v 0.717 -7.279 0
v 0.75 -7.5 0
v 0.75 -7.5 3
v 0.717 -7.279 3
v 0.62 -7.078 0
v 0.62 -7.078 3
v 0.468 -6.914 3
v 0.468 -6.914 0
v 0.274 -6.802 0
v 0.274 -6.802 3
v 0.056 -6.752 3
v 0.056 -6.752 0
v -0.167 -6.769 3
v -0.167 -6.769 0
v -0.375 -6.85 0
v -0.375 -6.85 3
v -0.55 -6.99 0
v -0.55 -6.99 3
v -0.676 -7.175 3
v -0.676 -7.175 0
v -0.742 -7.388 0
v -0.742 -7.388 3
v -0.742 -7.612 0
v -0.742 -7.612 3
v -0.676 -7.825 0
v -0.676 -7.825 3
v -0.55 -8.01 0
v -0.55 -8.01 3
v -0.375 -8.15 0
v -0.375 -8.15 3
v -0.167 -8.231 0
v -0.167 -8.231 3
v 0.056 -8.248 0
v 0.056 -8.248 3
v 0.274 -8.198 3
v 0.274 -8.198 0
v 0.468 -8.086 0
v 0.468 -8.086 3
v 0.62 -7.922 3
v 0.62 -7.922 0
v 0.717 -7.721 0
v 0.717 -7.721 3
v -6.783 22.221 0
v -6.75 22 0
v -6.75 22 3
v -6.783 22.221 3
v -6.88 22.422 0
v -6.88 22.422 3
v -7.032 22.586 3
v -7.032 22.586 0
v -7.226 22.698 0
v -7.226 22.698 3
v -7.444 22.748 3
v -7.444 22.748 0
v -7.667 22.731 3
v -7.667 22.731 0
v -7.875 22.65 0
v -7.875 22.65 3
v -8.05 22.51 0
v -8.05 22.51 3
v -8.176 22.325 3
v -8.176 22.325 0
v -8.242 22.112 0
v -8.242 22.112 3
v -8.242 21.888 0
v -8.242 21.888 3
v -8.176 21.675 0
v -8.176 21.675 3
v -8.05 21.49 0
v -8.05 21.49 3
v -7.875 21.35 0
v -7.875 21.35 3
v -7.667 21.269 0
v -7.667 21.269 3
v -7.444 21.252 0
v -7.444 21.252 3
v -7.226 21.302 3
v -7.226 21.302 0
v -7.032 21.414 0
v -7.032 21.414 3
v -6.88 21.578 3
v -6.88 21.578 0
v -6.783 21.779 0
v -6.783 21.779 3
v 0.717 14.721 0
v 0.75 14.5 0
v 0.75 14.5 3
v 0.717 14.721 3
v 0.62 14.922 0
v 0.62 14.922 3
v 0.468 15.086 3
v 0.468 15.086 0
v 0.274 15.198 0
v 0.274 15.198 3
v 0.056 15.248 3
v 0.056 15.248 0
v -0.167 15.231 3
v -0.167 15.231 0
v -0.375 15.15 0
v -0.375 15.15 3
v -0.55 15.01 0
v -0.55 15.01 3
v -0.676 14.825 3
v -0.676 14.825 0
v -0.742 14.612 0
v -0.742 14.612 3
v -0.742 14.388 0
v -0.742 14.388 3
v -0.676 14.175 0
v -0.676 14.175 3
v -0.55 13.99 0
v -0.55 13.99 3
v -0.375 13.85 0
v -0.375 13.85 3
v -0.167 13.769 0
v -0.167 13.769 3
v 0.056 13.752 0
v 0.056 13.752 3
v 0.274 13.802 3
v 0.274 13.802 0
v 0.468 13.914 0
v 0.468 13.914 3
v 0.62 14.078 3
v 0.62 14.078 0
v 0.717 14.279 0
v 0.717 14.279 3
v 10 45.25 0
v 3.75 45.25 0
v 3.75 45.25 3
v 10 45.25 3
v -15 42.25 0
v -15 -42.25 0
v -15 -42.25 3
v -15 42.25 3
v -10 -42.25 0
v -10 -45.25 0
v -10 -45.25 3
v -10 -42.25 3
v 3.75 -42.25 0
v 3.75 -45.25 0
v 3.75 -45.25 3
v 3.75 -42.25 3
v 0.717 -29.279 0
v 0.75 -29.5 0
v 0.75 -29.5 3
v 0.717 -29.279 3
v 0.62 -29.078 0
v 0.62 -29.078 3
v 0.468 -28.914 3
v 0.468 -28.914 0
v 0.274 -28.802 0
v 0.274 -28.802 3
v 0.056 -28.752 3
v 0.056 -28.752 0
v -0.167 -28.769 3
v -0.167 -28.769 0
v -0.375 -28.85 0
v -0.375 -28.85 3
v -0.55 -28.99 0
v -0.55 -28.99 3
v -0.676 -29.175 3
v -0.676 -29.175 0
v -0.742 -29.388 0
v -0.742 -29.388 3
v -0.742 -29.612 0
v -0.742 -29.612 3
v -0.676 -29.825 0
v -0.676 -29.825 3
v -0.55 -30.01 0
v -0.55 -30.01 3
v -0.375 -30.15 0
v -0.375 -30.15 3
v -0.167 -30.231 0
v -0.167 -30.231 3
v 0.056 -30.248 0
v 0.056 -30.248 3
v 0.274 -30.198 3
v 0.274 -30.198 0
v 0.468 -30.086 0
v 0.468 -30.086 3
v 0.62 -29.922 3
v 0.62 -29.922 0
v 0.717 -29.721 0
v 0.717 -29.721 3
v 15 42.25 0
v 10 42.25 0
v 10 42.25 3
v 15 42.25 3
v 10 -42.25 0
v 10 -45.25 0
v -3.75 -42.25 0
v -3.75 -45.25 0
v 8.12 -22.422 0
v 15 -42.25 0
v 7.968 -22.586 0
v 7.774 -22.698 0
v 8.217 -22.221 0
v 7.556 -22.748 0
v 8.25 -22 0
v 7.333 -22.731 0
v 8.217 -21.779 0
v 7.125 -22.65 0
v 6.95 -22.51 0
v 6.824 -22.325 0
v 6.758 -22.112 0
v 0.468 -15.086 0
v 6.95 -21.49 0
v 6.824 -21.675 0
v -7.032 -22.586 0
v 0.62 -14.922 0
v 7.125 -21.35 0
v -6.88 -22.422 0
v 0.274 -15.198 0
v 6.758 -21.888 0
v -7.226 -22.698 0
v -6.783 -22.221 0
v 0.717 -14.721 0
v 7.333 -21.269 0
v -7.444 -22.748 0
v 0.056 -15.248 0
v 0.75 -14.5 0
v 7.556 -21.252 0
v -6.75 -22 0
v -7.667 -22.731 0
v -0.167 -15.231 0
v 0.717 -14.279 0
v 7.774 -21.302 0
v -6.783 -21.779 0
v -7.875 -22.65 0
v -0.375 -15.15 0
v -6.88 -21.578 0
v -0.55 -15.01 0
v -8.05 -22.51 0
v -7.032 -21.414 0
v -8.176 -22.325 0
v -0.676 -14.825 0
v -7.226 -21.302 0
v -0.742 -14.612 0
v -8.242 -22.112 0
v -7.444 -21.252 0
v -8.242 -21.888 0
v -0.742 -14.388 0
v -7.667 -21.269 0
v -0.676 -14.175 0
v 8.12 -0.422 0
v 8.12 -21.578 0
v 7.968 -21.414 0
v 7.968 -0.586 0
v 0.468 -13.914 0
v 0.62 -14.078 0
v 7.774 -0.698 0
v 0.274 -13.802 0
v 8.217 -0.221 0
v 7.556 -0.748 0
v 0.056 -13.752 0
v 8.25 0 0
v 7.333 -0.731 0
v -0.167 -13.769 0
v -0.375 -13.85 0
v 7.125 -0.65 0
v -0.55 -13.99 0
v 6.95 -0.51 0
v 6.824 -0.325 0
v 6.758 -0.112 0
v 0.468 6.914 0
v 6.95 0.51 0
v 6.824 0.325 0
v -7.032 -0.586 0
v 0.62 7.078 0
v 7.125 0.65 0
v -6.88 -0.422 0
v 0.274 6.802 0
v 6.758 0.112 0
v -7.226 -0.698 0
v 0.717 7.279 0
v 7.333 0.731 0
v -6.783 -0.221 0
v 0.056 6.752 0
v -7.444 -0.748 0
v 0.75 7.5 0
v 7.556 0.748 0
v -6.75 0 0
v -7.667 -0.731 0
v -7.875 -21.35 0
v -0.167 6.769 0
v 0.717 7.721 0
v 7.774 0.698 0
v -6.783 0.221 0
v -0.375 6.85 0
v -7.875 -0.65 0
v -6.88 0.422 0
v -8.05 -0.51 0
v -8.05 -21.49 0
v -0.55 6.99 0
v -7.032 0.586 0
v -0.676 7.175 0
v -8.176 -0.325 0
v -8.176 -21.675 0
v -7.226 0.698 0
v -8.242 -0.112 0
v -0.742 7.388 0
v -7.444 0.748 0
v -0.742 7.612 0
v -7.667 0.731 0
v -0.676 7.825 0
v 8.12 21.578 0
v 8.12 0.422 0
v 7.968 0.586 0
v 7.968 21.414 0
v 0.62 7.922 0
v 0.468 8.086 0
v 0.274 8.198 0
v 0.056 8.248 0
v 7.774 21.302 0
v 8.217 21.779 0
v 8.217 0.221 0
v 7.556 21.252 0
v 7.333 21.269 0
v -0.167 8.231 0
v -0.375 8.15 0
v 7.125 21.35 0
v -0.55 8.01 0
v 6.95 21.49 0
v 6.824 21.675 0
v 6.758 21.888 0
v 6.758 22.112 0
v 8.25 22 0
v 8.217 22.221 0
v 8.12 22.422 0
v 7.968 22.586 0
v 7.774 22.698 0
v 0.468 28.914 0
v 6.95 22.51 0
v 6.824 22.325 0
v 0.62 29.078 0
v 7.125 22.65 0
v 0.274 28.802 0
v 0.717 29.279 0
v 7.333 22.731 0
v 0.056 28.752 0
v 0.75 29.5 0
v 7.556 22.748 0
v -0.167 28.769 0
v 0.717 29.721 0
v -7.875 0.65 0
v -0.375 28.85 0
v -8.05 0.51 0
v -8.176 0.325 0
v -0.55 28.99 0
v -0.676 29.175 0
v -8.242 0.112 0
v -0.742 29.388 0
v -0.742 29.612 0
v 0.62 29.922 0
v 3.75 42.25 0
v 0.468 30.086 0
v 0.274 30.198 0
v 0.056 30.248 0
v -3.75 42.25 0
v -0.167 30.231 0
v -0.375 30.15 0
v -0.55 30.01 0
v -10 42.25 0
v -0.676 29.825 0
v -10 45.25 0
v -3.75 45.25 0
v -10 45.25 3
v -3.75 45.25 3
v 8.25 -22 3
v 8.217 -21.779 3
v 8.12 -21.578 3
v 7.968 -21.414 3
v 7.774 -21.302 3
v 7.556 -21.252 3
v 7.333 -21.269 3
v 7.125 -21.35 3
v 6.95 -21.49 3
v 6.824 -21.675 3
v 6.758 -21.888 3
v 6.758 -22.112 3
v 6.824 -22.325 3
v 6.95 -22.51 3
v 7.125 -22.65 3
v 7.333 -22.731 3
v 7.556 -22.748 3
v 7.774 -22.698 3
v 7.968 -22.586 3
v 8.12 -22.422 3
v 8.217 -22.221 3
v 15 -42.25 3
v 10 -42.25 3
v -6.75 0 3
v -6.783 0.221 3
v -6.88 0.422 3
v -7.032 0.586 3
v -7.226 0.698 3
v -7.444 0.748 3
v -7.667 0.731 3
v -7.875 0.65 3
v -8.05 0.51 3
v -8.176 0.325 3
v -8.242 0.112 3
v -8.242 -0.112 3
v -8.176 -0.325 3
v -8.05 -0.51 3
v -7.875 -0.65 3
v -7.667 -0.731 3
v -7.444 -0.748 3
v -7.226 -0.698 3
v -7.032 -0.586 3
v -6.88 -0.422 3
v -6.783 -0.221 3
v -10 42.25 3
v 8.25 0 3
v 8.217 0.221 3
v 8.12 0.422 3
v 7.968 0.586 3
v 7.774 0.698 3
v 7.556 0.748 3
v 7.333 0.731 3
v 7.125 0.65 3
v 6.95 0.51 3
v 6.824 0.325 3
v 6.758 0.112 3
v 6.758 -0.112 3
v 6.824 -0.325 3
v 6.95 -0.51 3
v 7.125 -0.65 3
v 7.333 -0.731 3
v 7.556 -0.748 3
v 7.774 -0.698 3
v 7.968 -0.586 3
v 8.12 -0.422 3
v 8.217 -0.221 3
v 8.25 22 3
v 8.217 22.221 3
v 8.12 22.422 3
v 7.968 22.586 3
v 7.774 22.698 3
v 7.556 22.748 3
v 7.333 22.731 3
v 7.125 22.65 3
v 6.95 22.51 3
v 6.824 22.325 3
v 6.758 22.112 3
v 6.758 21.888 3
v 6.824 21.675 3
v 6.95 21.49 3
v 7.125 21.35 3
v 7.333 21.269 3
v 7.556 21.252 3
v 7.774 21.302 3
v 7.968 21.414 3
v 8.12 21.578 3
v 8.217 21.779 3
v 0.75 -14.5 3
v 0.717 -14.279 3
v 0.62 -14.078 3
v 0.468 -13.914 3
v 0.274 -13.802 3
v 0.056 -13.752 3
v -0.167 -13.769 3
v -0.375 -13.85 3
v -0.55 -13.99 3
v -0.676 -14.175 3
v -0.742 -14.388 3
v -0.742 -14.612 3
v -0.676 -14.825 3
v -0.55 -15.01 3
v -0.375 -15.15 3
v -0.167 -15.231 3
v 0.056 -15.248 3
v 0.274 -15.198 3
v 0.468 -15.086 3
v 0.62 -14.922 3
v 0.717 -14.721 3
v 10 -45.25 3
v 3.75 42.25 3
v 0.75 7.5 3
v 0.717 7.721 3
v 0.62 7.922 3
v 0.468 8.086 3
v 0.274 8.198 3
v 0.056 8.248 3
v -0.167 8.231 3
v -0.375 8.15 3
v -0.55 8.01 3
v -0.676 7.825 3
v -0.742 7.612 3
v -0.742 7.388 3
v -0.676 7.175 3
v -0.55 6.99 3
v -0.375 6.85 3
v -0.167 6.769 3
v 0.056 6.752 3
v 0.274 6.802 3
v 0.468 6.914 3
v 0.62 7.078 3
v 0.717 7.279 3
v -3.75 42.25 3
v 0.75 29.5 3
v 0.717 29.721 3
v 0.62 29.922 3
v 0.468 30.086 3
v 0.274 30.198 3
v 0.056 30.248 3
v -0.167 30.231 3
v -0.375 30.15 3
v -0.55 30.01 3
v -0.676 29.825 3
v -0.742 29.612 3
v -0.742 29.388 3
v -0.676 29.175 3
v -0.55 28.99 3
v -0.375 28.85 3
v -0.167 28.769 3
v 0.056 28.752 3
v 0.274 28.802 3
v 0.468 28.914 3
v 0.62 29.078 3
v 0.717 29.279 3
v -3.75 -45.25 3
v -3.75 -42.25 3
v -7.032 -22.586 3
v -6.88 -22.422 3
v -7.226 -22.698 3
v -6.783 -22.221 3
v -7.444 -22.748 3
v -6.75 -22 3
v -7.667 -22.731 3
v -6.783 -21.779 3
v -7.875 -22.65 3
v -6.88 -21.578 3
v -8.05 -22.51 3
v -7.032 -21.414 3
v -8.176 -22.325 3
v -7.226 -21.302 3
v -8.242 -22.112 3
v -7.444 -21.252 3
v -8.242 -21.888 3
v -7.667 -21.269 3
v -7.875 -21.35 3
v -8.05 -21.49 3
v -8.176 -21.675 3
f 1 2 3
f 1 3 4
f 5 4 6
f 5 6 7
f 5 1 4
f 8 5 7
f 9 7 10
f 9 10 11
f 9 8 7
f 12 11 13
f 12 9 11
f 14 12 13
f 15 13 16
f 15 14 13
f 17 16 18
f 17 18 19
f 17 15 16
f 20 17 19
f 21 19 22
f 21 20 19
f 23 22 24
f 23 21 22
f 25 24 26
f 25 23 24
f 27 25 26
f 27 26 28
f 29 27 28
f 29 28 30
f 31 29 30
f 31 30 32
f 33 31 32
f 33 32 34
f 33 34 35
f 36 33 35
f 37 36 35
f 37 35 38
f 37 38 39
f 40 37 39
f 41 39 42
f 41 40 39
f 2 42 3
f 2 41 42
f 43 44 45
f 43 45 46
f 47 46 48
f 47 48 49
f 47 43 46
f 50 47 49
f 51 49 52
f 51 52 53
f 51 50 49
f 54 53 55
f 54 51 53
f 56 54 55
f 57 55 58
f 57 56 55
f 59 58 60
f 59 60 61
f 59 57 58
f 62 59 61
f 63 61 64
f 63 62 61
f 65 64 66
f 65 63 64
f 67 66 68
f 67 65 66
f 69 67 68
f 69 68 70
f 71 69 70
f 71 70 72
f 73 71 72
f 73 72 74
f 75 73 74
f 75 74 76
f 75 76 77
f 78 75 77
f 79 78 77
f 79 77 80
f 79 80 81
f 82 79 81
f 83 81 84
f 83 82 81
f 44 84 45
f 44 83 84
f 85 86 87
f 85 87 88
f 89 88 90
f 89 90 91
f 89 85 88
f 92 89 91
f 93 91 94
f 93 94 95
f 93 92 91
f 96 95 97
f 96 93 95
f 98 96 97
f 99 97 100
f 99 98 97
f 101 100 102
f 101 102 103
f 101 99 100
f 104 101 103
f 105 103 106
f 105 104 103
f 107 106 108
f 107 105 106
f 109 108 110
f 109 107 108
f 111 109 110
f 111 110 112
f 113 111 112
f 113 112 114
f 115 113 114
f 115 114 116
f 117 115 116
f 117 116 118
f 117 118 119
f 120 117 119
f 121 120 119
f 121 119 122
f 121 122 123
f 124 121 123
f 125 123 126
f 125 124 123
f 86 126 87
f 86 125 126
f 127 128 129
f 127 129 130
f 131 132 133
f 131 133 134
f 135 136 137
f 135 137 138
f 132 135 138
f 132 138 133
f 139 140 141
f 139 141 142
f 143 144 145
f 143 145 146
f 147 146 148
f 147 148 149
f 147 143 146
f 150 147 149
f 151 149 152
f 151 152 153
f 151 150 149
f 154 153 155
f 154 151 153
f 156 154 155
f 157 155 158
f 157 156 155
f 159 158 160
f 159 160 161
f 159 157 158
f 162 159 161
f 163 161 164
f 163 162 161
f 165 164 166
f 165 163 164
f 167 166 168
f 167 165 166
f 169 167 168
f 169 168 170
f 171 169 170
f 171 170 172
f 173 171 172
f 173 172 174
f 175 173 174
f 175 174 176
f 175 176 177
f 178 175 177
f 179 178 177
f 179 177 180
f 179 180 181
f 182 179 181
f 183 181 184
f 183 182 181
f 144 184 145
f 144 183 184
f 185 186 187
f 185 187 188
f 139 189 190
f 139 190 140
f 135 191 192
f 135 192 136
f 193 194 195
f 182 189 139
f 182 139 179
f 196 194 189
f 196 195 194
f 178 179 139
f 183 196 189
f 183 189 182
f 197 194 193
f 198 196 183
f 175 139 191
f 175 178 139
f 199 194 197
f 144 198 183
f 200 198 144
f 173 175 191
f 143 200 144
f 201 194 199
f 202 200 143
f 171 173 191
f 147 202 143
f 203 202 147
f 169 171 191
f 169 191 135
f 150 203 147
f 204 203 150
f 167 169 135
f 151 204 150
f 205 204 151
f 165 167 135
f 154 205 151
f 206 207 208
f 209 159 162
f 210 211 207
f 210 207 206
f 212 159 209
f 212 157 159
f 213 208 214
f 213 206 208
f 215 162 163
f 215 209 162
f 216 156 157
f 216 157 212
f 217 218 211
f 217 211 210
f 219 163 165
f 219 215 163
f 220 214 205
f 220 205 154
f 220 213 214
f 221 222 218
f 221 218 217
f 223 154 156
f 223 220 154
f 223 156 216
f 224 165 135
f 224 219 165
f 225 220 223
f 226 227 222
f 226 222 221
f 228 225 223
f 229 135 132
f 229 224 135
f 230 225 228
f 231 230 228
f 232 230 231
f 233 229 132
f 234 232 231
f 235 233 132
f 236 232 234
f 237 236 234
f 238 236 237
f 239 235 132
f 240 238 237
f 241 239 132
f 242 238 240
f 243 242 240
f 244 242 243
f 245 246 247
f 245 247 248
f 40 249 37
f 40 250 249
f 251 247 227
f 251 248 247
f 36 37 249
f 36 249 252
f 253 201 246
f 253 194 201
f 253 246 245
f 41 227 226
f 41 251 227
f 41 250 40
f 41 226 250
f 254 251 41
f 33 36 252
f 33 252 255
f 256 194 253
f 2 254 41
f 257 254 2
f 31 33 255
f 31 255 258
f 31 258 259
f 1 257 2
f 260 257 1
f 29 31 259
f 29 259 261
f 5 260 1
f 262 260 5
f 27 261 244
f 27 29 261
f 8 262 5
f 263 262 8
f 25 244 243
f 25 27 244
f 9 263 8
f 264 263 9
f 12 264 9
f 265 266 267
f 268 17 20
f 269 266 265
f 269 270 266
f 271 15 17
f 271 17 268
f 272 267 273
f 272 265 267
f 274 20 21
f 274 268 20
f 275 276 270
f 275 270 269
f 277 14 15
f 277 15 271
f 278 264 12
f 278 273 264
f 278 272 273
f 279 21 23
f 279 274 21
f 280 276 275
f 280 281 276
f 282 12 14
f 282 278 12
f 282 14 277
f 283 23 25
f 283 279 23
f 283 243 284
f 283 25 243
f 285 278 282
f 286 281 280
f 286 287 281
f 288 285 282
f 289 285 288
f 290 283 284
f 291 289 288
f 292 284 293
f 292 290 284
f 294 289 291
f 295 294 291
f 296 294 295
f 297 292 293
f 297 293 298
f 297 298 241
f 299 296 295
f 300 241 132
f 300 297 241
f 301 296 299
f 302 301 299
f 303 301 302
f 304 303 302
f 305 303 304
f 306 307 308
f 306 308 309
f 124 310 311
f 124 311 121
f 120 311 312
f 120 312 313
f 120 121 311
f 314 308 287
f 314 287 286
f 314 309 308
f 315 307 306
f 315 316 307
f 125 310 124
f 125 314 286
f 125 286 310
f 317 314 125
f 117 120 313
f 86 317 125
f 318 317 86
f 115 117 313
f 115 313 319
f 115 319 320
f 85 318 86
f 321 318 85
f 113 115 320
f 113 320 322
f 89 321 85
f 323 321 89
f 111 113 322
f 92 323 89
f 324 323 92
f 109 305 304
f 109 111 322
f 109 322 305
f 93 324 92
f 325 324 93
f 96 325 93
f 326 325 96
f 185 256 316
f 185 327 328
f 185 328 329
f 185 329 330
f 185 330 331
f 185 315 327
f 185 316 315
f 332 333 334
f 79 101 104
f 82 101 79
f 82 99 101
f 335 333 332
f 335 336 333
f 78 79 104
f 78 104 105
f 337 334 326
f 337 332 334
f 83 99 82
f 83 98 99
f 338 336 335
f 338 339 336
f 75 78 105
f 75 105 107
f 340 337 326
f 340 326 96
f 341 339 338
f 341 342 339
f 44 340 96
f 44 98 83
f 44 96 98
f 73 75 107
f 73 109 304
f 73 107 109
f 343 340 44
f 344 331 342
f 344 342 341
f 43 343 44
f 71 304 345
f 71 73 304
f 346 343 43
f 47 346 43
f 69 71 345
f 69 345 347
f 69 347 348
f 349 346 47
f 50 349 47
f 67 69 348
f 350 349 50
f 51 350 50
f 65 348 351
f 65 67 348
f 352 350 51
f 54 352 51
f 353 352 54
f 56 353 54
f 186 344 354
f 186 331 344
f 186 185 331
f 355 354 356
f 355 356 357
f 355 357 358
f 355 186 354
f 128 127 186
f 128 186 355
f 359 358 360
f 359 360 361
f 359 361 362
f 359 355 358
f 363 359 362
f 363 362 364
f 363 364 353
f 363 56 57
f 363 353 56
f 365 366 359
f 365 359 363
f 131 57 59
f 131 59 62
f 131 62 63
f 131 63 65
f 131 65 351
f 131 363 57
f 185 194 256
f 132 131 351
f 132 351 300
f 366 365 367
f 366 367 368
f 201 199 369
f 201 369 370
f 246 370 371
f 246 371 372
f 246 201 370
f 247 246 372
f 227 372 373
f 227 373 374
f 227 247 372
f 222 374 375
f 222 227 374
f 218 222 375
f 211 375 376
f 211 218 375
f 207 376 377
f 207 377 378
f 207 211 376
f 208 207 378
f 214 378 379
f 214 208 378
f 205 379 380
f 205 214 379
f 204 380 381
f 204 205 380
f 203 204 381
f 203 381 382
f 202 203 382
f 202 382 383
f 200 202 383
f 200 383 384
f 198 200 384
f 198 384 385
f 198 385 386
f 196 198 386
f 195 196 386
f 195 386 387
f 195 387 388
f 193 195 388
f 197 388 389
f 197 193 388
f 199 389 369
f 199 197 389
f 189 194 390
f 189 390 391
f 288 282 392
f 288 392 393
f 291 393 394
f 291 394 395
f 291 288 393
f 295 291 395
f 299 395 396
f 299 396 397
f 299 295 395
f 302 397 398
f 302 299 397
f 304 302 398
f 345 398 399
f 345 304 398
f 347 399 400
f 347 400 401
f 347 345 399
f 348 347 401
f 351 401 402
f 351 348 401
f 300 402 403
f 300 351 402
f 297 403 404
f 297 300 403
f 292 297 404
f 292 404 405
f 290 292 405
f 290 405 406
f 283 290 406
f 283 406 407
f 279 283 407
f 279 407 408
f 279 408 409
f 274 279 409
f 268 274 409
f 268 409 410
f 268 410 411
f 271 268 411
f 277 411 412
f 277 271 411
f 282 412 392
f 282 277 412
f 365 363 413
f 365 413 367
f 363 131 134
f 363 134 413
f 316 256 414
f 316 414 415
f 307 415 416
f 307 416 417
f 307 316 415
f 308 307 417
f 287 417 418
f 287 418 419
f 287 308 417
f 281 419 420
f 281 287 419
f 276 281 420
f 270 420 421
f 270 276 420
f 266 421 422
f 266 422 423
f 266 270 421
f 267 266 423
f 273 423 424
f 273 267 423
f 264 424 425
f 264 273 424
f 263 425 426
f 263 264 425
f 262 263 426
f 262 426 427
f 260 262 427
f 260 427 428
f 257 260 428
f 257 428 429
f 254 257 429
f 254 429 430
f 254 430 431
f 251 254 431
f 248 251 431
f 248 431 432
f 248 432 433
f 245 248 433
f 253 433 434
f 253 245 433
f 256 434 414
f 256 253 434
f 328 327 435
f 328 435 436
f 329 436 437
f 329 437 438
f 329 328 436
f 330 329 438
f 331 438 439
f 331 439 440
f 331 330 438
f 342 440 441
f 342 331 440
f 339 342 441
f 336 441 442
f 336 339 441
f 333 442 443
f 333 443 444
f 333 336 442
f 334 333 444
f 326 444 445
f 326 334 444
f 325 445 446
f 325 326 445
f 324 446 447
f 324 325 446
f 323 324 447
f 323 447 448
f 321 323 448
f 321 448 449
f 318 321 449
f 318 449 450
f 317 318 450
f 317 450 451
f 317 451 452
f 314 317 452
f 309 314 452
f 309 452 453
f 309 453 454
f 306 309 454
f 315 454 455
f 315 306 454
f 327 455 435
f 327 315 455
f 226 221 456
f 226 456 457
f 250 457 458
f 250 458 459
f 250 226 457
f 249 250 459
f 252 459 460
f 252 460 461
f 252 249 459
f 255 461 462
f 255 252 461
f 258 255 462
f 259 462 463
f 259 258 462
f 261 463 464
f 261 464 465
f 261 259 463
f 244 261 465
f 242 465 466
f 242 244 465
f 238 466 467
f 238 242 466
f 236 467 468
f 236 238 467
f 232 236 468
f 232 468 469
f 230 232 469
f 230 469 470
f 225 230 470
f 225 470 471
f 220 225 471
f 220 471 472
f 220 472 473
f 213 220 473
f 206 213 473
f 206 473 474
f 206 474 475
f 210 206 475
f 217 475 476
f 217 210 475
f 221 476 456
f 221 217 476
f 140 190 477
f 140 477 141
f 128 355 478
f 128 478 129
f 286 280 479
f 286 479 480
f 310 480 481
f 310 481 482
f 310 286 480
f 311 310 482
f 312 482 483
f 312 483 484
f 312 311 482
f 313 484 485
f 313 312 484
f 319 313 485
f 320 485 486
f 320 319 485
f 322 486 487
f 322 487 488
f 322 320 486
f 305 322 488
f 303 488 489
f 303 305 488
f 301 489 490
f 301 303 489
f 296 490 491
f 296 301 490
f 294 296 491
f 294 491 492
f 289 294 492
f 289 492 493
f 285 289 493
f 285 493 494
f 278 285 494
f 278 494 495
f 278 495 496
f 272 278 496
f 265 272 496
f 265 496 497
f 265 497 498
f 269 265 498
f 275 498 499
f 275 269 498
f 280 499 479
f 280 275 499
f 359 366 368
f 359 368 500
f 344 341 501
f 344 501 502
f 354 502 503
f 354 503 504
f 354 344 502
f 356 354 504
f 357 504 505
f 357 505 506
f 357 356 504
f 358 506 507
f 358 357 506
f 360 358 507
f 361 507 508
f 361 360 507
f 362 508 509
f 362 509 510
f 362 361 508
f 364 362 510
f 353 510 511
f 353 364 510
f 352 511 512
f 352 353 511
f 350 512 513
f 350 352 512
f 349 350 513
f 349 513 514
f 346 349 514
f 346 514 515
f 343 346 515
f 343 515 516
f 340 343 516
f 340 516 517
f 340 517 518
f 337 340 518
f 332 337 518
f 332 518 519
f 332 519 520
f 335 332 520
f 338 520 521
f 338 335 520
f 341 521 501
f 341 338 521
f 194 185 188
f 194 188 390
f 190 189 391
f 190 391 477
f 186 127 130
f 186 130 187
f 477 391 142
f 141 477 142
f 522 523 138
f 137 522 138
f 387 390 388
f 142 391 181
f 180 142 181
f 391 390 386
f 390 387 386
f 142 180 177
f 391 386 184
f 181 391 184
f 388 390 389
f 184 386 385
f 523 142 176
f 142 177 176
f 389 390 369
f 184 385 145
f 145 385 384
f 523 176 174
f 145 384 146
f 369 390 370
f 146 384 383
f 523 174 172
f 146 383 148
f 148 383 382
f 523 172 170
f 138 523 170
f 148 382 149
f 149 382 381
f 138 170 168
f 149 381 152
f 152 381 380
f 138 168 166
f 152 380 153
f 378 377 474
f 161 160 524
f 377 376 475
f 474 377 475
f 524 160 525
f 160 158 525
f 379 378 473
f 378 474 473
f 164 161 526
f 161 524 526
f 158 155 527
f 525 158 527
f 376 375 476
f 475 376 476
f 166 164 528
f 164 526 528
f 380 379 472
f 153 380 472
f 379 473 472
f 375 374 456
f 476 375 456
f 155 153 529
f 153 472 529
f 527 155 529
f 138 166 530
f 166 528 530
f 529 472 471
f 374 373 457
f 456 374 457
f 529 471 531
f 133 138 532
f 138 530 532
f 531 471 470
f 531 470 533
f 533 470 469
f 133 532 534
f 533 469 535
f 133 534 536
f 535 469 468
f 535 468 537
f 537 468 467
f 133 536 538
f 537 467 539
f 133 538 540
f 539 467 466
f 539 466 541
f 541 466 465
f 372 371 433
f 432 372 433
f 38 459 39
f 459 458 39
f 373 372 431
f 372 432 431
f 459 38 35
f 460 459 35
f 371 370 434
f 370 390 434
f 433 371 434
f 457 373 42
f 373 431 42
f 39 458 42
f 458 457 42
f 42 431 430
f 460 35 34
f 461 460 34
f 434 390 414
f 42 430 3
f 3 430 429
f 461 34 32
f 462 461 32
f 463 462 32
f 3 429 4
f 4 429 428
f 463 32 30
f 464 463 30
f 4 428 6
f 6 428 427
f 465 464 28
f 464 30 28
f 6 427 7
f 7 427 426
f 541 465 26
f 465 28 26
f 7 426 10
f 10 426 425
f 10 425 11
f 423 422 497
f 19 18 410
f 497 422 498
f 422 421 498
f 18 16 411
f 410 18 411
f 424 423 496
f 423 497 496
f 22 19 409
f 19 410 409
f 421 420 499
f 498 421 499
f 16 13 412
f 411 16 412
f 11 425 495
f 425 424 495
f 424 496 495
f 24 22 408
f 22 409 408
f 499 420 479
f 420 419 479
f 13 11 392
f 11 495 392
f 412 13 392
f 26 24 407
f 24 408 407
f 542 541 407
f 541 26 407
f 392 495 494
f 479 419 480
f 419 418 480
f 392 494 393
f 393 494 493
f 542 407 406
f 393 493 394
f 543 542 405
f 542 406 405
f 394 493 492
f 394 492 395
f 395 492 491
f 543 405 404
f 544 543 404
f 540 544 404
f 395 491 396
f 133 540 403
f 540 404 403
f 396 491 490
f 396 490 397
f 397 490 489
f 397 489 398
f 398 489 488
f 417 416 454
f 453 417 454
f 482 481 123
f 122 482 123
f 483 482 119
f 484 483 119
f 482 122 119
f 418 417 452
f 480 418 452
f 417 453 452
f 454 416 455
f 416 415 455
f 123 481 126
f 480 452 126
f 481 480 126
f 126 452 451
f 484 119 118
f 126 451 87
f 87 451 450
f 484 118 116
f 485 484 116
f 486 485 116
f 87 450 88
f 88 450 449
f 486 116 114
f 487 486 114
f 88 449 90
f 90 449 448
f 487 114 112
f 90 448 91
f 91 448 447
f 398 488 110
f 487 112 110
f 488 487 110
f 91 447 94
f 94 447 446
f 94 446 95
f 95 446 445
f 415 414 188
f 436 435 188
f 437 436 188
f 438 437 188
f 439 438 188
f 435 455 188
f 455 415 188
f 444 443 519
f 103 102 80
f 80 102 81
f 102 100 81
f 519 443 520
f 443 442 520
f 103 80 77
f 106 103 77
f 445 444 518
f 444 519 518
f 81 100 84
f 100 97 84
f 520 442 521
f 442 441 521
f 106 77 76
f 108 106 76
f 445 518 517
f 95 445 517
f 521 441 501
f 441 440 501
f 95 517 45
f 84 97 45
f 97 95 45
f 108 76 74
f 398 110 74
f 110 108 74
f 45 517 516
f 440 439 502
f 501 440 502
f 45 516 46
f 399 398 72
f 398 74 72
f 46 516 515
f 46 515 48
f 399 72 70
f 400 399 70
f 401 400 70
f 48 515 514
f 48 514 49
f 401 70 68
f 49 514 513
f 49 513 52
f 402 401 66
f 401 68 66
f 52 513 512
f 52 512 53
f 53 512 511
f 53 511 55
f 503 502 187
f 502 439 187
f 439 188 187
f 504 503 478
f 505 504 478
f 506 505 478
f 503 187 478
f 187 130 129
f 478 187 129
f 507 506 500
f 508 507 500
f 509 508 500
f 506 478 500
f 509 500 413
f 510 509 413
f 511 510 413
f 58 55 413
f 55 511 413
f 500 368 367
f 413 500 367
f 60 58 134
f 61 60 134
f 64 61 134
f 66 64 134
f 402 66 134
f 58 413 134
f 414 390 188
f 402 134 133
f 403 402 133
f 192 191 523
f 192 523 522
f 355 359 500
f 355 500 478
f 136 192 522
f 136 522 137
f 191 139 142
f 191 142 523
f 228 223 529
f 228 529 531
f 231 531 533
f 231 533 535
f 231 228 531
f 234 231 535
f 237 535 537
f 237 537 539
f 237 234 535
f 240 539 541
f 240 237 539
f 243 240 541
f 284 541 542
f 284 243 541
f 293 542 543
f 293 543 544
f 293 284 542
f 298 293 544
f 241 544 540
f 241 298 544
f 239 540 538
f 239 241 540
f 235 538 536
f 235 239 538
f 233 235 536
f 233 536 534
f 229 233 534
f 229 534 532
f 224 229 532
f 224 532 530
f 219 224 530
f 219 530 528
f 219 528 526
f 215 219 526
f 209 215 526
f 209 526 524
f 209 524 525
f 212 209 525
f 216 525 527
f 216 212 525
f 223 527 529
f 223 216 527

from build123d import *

# Parameters (mm, degrees)
SKETCH1_R           = 0.75
BOSS_EXTRUDE1_DEPTH = 3


with BuildPart() as part:
    # Sketch1 → Boss-Extrude1 (new body)
    with BuildSketch(Plane.XY):
        Polygon((-15, 42.25), (-10, 42.25), (-10, 45.25), (-3.75, 45.25), (-3.75, 42.25), (3.75, 42.25), (3.75, 45.25), (10, 45.25), (10, 42.25), (15, 42.25), (15, -42.25), (10, -42.25), (10, -45.25), (3.75, -45.25), (3.75, -42.25), (-3.75, -42.25), (-3.75, -45.25), (-10, -45.25), (-10, -42.25), (-15, -42.25), align=None)
        with Locations((0, 29.5)):
            Circle(SKETCH1_R, mode=Mode.SUBTRACT)
        with Locations((7.5, 22)):
            Circle(SKETCH1_R, mode=Mode.SUBTRACT)
        with Locations((0, 14.5)):
            Circle(SKETCH1_R, mode=Mode.SUBTRACT)
        with Locations((-7.5, 22)):
            Circle(SKETCH1_R, mode=Mode.SUBTRACT)
        with Locations((0, 7.5)):
            Circle(SKETCH1_R, mode=Mode.SUBTRACT)
        with Locations((-7.5, 0)):
            Circle(SKETCH1_R, mode=Mode.SUBTRACT)
        with Locations((0, -7.5)):
            Circle(SKETCH1_R, mode=Mode.SUBTRACT)
        with Locations((7.5, 0)):
            Circle(SKETCH1_R, mode=Mode.SUBTRACT)
        with Locations((0, -14.5)):
            Circle(SKETCH1_R, mode=Mode.SUBTRACT)
        with Locations((-7.5, -22)):
            Circle(SKETCH1_R, mode=Mode.SUBTRACT)
        with Locations((0, -29.5)):
            Circle(SKETCH1_R, mode=Mode.SUBTRACT)
        with Locations((7.5, -22)):
            Circle(SKETCH1_R, mode=Mode.SUBTRACT)
    extrude(amount=BOSS_EXTRUDE1_DEPTH)


solid = part.part
